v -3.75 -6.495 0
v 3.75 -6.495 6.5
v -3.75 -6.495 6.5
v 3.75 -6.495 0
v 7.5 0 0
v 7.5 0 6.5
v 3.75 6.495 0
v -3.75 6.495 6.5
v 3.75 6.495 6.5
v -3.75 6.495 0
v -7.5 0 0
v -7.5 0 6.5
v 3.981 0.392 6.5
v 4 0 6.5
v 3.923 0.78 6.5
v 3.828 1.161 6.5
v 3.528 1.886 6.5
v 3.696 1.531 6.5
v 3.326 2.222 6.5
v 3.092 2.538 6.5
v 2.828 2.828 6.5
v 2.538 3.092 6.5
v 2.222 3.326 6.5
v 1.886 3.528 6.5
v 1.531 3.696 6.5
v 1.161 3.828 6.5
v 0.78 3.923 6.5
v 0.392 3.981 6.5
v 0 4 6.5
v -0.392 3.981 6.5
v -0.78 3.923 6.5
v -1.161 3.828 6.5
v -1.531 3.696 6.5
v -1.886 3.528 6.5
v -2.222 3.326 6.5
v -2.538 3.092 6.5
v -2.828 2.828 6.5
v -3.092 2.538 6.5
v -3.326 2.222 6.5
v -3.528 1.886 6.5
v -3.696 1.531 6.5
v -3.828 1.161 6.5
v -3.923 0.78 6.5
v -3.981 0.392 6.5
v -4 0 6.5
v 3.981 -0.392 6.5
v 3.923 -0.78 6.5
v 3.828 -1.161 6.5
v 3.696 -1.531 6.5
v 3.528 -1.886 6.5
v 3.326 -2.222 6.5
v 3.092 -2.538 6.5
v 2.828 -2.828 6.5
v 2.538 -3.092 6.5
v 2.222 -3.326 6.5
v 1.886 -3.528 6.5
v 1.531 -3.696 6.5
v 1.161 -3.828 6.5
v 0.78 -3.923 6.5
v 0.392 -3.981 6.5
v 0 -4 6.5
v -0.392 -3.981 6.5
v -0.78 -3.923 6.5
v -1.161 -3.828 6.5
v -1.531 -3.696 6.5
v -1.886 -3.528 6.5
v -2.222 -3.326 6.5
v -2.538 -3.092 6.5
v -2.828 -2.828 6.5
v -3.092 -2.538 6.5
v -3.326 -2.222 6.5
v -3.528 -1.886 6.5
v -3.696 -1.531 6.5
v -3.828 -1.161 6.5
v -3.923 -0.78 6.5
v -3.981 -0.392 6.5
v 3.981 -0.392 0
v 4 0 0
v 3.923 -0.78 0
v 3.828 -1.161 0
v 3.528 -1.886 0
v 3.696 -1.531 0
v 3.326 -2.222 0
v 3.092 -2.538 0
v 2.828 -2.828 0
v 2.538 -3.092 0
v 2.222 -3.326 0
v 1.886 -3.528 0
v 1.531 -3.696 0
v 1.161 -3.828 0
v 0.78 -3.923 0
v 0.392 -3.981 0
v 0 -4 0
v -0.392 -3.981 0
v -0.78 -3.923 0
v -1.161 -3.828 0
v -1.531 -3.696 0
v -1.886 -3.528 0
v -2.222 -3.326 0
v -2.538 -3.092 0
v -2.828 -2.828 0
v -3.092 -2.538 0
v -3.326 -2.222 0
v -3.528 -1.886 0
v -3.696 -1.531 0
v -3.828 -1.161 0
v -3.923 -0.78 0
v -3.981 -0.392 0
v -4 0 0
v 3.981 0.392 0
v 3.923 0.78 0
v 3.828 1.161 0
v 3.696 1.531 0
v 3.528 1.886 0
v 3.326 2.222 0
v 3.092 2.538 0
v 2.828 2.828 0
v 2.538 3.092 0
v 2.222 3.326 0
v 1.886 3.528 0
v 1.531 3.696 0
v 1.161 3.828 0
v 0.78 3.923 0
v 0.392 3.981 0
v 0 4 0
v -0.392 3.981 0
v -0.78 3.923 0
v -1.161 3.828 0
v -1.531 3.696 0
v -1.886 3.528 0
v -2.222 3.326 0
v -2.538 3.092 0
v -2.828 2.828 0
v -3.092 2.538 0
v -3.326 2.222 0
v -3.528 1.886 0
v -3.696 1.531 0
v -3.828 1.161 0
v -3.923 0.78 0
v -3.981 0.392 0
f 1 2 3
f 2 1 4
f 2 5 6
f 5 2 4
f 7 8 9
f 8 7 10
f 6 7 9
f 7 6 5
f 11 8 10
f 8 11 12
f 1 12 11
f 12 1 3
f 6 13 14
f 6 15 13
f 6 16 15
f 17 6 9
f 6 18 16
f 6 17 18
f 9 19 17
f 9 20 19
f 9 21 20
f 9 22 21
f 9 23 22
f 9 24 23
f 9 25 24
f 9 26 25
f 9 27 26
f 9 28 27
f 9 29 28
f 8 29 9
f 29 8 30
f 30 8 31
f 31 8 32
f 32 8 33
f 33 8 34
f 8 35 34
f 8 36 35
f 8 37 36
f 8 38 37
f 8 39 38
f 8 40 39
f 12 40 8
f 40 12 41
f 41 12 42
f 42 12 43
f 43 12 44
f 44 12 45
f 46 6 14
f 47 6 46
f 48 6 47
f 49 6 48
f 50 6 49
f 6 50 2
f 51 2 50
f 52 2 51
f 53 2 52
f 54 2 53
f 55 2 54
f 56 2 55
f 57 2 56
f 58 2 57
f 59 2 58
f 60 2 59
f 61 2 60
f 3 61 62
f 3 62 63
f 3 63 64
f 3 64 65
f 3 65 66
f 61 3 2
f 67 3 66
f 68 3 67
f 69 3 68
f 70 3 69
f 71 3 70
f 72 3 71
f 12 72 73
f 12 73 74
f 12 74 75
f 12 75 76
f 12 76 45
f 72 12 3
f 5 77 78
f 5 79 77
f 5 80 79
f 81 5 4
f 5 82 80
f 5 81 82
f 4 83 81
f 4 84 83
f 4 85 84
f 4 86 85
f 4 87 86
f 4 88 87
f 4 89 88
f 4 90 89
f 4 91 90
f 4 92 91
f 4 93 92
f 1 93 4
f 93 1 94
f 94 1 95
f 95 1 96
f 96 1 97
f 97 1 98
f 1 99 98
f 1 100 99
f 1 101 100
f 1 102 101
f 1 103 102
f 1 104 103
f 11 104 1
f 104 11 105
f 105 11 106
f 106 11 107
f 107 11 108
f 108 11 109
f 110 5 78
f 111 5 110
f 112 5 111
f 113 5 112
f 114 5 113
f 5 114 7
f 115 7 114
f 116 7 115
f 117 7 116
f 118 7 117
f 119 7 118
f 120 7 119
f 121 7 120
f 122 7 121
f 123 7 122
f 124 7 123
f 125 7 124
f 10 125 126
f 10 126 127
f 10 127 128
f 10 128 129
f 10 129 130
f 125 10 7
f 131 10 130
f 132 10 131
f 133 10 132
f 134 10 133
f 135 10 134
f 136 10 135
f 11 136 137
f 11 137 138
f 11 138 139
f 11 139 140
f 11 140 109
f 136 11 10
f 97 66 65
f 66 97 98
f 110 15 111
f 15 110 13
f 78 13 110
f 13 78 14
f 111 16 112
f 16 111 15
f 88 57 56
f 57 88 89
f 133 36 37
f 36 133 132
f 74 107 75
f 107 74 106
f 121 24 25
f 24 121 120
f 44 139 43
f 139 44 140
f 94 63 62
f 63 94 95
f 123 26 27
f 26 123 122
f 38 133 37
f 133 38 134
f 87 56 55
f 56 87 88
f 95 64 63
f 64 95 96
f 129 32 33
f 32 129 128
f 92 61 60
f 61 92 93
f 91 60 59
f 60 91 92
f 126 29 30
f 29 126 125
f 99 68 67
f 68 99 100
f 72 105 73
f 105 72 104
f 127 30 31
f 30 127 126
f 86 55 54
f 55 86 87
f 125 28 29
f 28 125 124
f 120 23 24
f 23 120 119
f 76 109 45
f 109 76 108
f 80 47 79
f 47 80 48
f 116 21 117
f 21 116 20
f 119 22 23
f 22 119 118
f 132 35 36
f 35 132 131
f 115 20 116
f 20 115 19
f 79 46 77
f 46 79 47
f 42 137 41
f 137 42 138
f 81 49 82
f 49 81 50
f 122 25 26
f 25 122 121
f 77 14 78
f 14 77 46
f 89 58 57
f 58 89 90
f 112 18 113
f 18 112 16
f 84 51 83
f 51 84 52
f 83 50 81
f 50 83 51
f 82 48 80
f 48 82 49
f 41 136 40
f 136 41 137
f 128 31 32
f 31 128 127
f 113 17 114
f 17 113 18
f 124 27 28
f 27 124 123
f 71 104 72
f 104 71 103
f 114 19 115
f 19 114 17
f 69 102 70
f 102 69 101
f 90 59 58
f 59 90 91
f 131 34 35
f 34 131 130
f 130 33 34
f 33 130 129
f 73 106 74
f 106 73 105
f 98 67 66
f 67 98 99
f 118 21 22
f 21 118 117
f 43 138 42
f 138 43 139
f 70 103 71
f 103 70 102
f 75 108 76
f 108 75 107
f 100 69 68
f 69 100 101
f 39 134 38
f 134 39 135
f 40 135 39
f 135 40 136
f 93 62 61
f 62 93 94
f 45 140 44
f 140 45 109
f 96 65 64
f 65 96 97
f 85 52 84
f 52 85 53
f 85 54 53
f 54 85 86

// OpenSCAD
module hex_nut() {
    difference() {
        // Create hexagonal prism
        scale([1, 1, 6.5/2]) 
            cylinder(d=15.0, h=2, $fn=6);
        
        // Subtract the cylindrical hole
        translate([0, 0, -1])
            cylinder(d=8.0, h=8, $fn=64);
    }
}

hex_nut();
